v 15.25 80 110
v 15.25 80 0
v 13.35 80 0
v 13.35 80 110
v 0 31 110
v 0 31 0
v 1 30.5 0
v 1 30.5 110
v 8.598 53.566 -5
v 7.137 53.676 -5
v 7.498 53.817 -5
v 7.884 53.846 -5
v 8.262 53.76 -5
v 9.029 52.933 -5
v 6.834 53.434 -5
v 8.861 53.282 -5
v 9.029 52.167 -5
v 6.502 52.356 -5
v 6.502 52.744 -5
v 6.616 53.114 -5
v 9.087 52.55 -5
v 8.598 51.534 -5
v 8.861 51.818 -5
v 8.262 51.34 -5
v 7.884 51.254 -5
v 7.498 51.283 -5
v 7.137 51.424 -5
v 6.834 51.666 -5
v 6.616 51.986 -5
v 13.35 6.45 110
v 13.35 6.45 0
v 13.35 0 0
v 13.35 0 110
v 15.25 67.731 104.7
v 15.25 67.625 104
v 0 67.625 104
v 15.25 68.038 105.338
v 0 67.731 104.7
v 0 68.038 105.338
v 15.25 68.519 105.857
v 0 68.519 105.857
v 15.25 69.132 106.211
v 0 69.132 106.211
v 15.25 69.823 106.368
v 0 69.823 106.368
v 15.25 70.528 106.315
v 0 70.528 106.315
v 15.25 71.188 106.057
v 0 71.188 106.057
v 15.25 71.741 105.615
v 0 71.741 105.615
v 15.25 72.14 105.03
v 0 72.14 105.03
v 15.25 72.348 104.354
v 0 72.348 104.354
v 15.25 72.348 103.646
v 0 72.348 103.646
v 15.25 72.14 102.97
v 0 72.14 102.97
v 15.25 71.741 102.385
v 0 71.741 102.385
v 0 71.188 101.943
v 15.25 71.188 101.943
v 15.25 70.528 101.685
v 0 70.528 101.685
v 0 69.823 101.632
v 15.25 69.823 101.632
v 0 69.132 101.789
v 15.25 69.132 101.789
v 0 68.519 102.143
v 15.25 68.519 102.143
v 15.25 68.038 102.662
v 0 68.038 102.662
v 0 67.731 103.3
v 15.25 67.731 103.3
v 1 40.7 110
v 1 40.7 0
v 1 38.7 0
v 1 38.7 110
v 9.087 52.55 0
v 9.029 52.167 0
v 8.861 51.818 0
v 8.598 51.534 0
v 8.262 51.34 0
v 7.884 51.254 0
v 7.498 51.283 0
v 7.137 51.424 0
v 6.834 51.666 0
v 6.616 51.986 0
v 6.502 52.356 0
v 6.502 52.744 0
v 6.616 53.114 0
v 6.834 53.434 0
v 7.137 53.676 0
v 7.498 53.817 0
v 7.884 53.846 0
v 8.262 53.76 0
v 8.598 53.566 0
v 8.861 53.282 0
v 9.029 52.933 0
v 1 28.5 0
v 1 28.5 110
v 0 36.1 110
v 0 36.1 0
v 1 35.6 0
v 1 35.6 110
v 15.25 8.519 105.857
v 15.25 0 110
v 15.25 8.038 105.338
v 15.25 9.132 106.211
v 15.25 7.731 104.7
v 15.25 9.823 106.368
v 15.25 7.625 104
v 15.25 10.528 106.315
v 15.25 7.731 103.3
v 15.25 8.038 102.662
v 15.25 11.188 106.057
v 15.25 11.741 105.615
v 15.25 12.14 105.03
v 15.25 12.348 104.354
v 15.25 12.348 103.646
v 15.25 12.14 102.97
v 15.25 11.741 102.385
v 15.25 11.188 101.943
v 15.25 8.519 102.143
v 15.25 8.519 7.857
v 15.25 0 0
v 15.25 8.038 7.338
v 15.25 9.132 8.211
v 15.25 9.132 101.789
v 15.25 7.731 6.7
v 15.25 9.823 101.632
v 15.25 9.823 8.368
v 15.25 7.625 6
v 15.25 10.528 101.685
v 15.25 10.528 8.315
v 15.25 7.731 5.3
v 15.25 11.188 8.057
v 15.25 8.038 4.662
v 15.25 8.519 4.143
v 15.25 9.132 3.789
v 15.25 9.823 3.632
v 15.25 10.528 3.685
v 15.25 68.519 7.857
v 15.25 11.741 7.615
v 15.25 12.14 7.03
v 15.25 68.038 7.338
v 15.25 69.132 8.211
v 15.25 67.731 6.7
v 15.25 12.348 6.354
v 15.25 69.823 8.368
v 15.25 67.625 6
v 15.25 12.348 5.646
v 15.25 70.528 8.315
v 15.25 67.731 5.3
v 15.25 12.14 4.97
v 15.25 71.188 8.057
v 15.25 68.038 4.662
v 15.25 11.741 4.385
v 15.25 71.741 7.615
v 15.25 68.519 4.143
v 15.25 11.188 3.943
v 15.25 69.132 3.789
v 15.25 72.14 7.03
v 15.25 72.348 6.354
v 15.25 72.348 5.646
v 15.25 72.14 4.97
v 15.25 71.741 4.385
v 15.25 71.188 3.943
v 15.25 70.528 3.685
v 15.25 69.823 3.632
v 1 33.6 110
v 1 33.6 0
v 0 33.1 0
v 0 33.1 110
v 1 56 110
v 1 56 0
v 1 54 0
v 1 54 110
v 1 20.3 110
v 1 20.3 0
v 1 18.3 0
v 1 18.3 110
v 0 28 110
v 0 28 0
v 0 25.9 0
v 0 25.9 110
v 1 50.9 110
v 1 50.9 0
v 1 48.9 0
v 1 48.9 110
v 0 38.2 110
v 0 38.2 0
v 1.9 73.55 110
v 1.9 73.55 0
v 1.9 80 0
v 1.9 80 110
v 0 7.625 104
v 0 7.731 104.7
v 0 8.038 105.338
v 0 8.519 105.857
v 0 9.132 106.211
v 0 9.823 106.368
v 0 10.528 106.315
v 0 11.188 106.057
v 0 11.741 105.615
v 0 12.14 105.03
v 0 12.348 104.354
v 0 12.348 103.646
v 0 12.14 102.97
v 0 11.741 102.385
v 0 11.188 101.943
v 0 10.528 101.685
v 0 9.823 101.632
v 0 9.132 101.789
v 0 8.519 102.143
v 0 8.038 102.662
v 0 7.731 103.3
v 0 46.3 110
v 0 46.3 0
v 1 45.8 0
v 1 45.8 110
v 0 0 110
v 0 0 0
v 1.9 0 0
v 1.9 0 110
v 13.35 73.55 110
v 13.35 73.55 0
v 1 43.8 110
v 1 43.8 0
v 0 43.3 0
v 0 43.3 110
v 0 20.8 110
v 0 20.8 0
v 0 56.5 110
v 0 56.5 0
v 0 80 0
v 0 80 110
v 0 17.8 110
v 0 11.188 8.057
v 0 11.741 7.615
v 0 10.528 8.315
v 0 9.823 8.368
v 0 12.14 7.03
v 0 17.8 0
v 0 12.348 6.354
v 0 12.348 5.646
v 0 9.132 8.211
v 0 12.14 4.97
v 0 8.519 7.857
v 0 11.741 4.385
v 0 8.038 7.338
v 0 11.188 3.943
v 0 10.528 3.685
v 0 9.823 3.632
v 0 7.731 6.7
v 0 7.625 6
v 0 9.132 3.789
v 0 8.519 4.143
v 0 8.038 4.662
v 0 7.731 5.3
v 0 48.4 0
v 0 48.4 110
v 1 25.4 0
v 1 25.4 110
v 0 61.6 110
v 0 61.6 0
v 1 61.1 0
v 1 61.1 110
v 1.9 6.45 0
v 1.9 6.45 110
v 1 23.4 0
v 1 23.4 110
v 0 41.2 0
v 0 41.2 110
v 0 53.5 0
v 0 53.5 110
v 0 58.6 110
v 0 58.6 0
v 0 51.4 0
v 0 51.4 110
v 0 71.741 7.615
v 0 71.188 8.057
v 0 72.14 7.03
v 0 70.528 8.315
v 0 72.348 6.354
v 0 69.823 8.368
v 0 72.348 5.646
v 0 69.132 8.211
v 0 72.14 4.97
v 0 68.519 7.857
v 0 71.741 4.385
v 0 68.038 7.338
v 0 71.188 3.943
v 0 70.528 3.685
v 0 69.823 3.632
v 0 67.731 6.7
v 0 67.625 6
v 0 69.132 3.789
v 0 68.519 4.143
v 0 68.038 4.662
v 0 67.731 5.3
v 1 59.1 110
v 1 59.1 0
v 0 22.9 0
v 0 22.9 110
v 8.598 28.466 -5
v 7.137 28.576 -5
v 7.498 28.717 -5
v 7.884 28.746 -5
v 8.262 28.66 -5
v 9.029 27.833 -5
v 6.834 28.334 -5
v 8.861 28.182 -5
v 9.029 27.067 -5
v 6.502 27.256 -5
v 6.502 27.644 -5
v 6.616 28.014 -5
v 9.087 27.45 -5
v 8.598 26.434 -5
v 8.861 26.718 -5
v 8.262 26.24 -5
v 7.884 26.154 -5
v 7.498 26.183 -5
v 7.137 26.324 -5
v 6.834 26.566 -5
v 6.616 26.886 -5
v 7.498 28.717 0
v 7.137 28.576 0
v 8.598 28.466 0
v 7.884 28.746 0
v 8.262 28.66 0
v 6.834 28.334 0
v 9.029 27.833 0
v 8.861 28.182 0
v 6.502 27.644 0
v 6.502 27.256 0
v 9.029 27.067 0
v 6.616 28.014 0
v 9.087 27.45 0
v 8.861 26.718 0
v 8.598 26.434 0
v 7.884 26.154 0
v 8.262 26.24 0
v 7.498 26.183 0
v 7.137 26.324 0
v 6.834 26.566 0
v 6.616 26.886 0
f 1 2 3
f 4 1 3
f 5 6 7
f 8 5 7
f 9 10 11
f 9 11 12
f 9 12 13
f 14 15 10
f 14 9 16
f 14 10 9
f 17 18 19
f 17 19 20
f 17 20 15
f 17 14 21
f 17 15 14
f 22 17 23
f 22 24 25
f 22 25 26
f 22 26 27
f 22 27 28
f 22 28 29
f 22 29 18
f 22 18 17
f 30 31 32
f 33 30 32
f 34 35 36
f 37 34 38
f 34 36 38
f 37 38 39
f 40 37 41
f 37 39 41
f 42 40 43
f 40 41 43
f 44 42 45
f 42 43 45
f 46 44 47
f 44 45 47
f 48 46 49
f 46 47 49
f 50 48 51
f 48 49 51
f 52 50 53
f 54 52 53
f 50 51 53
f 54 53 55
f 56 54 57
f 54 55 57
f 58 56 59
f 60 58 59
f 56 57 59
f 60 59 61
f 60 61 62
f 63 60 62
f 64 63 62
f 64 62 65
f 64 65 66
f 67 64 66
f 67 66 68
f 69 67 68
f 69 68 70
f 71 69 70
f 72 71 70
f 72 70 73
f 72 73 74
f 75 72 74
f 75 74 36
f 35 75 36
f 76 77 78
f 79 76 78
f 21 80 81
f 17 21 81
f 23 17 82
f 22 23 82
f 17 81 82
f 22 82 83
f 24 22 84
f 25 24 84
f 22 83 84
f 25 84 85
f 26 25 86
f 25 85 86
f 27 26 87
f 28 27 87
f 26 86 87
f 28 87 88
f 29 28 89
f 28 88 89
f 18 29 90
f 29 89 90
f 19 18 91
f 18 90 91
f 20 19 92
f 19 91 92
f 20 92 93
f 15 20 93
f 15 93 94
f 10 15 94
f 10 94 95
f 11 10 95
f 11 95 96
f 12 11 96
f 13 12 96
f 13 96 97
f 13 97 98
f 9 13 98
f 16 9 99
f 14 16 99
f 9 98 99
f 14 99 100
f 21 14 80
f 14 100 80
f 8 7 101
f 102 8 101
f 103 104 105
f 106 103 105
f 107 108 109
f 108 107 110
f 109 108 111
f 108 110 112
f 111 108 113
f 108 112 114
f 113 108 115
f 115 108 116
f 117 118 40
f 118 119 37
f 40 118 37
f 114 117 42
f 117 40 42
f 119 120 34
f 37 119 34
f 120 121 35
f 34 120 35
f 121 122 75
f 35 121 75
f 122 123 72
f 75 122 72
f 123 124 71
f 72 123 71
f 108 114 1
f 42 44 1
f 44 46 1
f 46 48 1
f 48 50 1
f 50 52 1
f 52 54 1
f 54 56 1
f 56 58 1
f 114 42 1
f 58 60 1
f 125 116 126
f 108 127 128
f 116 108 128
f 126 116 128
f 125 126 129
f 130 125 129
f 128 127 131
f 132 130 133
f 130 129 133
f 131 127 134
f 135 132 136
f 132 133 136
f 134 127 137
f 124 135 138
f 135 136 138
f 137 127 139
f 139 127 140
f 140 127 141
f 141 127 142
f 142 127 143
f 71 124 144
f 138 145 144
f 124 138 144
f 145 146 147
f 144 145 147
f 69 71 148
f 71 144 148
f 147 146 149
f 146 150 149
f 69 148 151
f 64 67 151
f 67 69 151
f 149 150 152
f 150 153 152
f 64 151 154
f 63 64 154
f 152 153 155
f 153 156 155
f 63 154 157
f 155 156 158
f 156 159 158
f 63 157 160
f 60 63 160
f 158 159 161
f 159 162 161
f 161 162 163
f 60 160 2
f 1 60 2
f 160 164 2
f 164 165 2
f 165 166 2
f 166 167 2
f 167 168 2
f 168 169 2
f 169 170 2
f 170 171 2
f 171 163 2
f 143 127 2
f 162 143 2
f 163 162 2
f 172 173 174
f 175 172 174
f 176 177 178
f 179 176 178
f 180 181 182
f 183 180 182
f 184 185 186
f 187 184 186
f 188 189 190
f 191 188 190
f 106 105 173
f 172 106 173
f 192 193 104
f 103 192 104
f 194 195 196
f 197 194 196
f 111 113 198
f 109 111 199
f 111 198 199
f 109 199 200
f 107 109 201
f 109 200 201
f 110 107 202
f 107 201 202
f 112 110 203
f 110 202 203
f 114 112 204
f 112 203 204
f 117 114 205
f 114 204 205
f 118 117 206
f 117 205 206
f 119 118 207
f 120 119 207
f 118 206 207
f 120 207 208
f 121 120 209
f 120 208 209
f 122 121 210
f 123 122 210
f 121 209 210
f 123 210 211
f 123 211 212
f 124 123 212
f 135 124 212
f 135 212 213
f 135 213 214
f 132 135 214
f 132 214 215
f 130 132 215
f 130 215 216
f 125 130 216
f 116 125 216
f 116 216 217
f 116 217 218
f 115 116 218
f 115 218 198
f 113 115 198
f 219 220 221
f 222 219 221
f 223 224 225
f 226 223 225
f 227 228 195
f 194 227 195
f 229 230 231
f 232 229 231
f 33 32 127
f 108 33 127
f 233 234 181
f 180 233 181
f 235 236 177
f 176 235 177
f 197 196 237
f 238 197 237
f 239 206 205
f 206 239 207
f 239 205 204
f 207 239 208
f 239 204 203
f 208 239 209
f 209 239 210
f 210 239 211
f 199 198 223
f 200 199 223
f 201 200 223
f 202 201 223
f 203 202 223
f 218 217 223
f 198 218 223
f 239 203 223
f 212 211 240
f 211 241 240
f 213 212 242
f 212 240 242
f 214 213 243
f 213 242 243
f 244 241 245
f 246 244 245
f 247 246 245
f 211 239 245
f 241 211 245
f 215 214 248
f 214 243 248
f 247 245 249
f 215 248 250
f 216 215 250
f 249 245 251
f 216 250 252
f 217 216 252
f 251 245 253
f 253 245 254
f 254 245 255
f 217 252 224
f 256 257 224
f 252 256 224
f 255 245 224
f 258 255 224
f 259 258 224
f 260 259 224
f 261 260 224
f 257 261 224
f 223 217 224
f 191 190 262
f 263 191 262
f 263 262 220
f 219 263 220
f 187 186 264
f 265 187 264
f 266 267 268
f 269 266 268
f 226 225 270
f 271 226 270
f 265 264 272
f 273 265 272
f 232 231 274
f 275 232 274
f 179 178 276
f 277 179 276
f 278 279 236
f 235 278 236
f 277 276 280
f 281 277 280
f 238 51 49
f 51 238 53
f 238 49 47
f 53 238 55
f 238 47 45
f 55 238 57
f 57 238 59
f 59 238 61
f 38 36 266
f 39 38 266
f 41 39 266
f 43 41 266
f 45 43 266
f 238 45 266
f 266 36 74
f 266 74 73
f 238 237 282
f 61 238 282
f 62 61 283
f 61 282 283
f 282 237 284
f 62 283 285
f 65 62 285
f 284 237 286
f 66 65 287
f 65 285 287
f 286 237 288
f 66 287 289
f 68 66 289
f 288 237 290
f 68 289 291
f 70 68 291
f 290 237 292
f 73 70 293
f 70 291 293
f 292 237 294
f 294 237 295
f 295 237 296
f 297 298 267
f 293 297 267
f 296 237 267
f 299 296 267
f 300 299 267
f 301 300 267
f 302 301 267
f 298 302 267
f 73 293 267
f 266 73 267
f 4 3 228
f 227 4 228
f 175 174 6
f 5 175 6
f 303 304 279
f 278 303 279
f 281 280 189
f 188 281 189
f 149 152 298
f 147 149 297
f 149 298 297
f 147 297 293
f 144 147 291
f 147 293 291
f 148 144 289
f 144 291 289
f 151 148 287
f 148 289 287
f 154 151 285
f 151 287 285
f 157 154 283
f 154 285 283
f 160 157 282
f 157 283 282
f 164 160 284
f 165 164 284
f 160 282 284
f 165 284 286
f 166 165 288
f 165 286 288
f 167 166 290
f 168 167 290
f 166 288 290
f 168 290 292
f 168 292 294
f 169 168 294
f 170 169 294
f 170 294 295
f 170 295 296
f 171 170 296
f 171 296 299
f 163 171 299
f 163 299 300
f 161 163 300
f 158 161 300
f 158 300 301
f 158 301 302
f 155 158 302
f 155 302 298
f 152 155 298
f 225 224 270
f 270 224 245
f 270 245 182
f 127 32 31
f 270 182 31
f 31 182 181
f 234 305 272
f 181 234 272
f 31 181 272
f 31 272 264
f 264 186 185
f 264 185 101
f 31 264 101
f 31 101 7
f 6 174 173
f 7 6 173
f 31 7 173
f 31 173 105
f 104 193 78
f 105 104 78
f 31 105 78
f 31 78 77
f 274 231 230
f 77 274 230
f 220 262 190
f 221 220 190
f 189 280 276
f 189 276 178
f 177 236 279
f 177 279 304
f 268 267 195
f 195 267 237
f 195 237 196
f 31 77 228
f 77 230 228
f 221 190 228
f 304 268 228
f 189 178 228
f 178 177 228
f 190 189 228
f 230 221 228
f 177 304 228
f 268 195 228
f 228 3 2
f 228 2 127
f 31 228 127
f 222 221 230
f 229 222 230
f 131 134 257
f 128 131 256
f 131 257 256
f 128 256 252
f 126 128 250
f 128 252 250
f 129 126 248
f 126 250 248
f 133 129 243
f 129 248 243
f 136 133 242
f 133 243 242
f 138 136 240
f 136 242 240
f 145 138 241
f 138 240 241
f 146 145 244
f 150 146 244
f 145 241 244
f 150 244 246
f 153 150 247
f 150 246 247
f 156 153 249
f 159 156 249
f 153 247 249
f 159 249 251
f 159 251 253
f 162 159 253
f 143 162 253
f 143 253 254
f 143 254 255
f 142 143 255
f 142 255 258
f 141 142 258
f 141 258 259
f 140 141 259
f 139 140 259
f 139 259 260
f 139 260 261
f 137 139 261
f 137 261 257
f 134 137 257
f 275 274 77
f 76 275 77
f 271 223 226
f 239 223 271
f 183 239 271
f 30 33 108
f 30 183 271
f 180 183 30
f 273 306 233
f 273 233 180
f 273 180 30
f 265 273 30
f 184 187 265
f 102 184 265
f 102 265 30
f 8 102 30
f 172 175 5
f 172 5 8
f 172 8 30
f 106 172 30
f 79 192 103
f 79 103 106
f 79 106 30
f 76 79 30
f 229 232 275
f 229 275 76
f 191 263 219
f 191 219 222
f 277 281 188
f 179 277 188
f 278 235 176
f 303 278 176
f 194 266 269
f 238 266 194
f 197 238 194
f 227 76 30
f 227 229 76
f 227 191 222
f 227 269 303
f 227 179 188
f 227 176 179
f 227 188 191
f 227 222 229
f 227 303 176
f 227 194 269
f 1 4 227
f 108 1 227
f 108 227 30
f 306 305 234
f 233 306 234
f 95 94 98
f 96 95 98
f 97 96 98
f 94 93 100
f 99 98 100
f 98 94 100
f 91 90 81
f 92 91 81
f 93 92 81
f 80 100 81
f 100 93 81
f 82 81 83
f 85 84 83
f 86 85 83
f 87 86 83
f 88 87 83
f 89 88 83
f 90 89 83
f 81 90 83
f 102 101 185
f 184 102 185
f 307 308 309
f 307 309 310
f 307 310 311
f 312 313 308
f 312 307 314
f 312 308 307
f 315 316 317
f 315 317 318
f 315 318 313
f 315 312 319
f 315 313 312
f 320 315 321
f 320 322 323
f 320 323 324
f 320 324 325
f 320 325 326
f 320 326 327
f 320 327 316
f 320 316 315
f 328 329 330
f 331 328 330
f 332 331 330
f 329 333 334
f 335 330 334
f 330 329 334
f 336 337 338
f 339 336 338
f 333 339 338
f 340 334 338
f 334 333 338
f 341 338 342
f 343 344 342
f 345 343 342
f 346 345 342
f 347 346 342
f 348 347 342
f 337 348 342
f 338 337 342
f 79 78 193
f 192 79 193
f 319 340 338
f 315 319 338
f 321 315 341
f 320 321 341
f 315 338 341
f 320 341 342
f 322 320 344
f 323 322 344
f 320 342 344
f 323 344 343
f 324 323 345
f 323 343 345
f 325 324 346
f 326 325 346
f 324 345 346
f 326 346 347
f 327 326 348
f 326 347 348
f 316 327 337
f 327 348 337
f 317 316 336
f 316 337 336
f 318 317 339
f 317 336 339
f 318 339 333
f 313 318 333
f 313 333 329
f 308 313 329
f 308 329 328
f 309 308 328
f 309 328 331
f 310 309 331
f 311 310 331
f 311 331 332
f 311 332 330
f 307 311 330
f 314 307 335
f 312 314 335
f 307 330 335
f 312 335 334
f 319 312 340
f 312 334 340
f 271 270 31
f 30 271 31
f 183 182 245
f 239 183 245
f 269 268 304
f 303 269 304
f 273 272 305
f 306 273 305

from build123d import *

# Parameters (mm, degrees)
F1_DEPTH = 110
F2_R     = 2.375
F3_DEPTH = 15.251
F4_R     = 1.3
F5_DEPTH = 5
F6_DEPTH = 5


with BuildPart() as f1:
    # F0 (on Top) → F1 (new body)
    with BuildSketch(Plane.XY):
        Polygon((0, 17.8), (0, 0), (1.9, 0), (1.9, 6.45), (13.35, 6.45), (13.35, 0), (15.25, 0), (15.25, 80), (13.35, 80), (13.35, 73.55), (1.9, 73.55), (1.9, 80), (0, 80), (0, 61.6), (1, 61.1), (1, 59.1), (0, 58.6), (0, 56.5), (1, 56), (1, 54), (0, 53.5), (0, 51.4), (1, 50.9), (1, 48.9), (0, 48.4), (0, 46.3), (1, 45.8), (1, 43.8), (0, 43.3), (0, 41.2), (1, 40.7), (1, 38.7), (0, 38.2), (0, 36.1), (1, 35.6), (1, 33.6), (0, 33.1), (0, 31), (1, 30.5), (1, 28.5), (0, 28), (0, 25.9), (1, 25.4), (1, 23.4), (0, 22.9), (0, 20.8), (1, 20.3), (1, 18.3), align=None)
    extrude(amount=F1_DEPTH)

    # F2 (on face) → F3 (cut, through all)
    with BuildSketch(Plane(origin=(0, 0, 0), x_dir=(0, -1, 0), z_dir=(-1, 0, 0))):
        with Locations((-70, 6)):
            Circle(F2_R)
        with Locations((-10, 6)):
            Circle(F2_R)
        with Locations((-70, 104)):
            Circle(F2_R)
        with Locations((-10, 104)):
            Circle(F2_R)
    extrude(amount=-F3_DEPTH, mode=Mode.SUBTRACT)


with BuildPart() as f5:
    # F4 (on face) → F5 (new body)
    with BuildSketch(Plane(origin=(0, 0, 0), x_dir=(1, 0, 0), z_dir=(0, 0, -1))):
        with Locations((7.787197, -27.45)):
            Circle(F4_R)
    extrude(amount=F5_DEPTH)


with BuildPart() as f6:
    # F4 (on face) → F6 (new body)
    with BuildSketch(Plane(origin=(0, 0, 0), x_dir=(1, 0, 0), z_dir=(0, 0, -1))):
        with Locations((7.787197, -52.55)):
            Circle(F4_R)
    extrude(amount=F6_DEPTH)


solid = Compound([f1.part, f5.part, f6.part])
